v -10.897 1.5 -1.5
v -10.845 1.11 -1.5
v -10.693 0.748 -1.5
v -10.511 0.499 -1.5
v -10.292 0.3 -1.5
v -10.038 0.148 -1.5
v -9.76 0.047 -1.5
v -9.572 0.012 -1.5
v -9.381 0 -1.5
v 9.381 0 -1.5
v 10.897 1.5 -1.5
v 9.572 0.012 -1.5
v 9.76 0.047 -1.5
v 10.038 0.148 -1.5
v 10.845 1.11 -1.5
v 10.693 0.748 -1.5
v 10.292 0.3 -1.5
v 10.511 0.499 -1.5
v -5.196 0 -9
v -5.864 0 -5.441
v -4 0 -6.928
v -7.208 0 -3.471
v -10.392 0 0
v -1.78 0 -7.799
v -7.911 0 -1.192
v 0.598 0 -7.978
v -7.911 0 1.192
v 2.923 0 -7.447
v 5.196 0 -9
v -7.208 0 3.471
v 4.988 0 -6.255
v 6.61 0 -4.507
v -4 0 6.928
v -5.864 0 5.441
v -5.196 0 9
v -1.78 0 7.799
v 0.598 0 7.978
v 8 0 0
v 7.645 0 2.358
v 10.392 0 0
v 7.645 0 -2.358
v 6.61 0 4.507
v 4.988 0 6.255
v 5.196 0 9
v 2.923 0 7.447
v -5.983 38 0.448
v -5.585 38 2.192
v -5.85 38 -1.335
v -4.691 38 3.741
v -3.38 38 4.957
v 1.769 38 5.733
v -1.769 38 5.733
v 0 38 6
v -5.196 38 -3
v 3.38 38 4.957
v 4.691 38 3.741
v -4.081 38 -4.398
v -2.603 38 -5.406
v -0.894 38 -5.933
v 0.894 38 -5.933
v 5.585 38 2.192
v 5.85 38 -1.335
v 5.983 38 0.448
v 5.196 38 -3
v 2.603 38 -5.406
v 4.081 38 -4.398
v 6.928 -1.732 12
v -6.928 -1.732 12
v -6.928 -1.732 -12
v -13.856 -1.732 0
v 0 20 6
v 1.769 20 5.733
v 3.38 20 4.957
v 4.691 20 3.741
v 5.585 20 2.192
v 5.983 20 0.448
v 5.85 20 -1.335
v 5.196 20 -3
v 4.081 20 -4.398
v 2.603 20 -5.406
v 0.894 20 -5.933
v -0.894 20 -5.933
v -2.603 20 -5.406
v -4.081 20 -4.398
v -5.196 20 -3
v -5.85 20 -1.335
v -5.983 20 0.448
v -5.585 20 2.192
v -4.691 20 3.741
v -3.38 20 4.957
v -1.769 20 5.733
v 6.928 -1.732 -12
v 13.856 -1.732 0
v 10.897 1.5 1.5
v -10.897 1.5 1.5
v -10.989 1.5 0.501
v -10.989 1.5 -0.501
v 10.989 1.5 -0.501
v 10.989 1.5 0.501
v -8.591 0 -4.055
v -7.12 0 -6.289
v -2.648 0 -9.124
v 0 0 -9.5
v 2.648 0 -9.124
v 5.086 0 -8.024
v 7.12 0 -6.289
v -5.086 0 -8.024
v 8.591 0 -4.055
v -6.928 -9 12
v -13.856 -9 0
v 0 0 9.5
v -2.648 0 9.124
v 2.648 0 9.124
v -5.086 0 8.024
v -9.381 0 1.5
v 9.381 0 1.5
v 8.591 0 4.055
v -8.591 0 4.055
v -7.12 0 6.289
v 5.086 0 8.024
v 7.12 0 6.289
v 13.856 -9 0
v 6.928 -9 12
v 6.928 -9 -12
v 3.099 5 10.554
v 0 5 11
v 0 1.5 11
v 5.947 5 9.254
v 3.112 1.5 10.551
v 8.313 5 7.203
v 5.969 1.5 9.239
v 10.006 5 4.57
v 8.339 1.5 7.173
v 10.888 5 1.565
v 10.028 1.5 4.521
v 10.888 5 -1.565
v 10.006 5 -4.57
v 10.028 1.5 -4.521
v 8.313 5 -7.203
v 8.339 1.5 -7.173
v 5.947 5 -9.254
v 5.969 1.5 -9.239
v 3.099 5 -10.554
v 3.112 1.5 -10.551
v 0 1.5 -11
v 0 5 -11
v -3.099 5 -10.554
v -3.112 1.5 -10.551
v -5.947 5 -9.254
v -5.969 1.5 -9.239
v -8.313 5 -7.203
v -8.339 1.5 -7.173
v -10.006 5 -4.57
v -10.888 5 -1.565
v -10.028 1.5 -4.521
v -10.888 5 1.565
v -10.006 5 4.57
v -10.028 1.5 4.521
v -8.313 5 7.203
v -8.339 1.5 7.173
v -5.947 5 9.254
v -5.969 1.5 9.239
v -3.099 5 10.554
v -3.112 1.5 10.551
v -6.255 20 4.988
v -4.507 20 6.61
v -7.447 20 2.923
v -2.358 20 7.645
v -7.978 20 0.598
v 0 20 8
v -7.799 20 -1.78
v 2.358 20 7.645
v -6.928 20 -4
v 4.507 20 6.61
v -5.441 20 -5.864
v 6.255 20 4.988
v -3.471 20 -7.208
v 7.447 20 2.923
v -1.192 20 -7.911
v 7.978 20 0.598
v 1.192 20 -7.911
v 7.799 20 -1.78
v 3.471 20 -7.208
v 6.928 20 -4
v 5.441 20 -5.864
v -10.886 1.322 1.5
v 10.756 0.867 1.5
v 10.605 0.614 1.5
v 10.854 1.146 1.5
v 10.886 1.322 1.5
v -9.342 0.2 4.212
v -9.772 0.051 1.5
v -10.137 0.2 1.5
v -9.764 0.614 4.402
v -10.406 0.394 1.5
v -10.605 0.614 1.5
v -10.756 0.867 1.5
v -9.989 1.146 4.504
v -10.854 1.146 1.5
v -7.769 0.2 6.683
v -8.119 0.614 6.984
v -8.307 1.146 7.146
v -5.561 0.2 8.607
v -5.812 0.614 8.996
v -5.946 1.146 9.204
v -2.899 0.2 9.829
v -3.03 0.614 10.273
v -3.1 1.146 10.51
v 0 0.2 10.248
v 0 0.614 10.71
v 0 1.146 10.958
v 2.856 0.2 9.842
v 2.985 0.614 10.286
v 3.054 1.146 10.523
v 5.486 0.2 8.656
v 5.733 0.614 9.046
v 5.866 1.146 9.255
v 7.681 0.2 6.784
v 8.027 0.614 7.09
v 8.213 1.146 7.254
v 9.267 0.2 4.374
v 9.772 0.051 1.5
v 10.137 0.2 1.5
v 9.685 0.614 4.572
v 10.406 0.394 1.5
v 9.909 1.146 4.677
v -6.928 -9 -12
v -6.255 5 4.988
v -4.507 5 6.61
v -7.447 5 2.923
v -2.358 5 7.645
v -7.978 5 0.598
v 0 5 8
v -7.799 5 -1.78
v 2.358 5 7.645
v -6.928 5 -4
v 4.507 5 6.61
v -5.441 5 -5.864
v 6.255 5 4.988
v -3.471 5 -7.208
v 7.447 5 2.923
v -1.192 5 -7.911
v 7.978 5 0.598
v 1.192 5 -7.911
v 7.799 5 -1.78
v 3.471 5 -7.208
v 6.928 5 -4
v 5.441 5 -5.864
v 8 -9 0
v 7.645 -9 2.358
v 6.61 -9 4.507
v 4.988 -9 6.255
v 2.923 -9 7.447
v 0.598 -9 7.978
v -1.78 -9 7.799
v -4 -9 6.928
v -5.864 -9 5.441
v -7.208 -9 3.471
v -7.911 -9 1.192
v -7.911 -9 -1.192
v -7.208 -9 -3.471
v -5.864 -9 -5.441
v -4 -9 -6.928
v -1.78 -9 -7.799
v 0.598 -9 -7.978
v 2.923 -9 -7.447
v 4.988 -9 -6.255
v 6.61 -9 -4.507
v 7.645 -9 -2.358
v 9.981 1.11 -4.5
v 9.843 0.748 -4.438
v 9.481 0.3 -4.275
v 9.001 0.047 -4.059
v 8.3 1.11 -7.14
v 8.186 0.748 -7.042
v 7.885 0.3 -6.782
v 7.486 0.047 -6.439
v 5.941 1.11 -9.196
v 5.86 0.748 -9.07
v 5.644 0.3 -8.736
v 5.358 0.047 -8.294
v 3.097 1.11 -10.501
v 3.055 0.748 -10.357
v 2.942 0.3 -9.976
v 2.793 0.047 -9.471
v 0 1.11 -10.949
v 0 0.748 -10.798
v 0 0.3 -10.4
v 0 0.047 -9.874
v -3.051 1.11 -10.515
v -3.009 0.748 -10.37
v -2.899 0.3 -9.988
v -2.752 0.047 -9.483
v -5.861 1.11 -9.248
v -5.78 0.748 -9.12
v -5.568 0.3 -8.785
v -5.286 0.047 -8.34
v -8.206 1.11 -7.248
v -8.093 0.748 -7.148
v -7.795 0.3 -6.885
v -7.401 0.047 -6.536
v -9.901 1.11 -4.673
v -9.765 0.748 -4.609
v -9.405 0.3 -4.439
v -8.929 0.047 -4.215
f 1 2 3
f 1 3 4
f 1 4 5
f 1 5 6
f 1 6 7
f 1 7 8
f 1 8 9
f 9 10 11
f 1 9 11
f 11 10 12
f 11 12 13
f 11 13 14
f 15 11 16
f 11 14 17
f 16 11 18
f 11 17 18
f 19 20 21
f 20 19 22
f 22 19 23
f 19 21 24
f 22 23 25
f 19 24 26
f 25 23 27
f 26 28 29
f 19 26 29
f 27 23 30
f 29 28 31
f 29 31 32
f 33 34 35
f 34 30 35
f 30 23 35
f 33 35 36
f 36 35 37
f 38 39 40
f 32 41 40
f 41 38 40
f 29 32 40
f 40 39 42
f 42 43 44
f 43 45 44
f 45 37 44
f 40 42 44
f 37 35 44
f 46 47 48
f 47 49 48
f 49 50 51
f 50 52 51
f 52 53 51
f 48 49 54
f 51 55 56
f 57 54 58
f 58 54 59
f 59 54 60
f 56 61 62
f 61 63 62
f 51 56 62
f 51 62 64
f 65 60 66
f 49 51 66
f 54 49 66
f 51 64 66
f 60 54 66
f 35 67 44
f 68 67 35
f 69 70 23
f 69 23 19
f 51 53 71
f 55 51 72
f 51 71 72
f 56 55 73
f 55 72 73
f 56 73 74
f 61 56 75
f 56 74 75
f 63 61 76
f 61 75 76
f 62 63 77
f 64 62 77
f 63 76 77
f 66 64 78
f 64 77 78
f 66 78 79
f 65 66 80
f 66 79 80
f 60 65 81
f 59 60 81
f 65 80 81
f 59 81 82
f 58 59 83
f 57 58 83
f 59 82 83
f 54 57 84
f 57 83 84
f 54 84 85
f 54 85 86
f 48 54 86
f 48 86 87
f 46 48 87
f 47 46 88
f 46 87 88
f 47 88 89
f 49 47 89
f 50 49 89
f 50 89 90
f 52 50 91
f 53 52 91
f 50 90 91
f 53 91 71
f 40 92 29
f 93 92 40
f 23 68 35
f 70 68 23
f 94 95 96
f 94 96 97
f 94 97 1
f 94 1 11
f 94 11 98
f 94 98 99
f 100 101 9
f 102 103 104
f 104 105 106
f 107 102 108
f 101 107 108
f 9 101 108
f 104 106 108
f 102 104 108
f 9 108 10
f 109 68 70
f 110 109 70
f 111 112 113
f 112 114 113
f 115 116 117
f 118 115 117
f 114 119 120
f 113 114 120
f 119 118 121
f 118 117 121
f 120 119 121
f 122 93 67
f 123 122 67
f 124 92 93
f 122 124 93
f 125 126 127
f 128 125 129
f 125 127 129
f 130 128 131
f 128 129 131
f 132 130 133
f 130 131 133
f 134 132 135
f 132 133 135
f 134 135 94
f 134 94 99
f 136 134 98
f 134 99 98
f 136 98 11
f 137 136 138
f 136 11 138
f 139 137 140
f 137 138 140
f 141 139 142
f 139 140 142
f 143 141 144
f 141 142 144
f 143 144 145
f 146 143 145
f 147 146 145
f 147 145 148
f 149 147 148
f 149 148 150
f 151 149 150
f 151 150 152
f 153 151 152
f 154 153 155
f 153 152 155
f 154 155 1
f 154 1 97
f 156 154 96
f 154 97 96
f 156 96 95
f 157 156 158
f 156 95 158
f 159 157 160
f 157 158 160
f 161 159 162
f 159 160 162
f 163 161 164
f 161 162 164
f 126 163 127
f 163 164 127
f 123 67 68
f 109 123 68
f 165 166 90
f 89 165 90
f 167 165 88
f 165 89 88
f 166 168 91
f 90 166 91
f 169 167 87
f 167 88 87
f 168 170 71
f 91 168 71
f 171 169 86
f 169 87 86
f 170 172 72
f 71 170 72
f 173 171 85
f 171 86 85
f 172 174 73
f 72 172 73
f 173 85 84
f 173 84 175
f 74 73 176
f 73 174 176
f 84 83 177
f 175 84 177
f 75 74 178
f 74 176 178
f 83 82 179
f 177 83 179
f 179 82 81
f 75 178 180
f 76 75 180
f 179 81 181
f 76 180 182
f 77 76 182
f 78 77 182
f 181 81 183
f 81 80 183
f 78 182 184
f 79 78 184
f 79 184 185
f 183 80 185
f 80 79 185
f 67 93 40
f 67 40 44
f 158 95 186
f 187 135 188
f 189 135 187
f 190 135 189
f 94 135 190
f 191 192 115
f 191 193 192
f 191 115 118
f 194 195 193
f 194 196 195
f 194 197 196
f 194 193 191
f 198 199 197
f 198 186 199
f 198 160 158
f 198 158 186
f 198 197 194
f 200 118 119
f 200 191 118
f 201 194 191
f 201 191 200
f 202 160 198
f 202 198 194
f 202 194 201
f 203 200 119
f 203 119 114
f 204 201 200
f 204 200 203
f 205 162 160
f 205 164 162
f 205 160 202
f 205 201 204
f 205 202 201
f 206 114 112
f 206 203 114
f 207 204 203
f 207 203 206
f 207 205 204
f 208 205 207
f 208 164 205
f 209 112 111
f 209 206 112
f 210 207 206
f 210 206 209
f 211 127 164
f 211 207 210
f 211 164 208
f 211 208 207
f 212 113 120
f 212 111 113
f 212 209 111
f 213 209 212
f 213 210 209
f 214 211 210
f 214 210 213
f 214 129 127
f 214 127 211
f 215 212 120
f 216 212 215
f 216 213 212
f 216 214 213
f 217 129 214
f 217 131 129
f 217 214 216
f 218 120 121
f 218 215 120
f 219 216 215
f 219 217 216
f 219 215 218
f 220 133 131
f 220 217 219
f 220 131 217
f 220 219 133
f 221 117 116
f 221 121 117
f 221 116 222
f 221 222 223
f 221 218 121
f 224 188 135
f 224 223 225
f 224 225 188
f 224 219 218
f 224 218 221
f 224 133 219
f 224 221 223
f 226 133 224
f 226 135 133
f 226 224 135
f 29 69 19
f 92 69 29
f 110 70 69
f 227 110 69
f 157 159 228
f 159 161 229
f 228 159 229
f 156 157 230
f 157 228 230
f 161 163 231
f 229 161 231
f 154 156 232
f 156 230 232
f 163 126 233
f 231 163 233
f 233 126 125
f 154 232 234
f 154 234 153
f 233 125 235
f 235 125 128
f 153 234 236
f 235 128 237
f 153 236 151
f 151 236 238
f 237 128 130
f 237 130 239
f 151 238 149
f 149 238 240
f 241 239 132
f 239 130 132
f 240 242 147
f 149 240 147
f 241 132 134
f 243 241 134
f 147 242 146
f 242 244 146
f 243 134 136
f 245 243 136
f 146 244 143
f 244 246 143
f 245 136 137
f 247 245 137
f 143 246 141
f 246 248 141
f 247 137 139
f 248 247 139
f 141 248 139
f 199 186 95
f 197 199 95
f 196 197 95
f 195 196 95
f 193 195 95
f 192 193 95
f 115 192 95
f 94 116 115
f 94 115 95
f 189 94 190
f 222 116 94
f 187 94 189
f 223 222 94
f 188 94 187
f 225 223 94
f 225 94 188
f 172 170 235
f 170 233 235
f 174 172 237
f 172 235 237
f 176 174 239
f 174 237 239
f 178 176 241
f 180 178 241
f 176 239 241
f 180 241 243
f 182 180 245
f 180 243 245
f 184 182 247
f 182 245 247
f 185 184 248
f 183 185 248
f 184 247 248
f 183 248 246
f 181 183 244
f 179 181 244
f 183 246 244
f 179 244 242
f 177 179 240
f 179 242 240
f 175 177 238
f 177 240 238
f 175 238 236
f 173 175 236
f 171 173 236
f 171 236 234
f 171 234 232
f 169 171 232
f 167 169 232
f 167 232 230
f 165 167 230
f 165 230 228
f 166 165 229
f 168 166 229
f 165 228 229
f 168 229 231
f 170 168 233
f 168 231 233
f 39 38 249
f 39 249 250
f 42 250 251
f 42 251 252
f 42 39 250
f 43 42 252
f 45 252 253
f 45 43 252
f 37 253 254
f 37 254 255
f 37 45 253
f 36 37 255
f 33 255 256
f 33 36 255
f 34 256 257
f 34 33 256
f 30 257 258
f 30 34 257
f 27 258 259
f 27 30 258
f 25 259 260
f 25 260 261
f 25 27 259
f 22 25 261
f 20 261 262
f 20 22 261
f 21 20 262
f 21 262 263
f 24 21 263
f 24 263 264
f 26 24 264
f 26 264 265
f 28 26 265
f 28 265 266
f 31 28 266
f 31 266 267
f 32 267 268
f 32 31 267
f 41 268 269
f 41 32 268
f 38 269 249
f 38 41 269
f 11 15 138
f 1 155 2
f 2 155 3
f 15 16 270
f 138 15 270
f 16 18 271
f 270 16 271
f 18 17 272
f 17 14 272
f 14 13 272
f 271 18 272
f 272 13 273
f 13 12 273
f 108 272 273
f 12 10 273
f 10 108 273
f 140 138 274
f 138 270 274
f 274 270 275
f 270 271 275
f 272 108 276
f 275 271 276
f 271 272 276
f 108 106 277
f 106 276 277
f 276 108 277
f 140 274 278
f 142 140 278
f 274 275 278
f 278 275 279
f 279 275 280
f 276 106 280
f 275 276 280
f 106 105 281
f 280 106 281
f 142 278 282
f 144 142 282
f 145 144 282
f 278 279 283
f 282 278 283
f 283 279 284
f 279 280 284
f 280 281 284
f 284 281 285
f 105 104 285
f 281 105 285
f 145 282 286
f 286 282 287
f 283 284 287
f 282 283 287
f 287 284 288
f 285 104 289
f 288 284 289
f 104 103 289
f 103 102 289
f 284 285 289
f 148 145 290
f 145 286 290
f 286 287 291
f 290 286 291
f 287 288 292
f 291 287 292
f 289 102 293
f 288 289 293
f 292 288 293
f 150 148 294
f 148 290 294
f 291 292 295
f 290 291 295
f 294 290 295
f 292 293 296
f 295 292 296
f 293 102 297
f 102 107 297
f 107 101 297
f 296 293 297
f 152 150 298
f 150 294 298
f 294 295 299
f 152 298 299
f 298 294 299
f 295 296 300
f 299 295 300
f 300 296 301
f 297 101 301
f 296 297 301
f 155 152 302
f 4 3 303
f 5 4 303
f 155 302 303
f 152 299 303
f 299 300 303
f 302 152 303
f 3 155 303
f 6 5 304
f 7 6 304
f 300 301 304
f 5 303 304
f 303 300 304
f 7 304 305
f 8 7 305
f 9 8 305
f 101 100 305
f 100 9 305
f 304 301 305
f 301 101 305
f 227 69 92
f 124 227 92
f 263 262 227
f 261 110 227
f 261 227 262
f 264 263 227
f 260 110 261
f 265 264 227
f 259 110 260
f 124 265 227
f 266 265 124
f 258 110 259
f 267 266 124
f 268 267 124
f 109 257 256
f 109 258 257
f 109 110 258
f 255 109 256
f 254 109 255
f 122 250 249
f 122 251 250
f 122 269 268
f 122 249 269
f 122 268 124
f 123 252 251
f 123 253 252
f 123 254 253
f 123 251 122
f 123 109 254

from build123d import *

# Parameters (mm, degrees)
F2_R     = 8
F3_DEPTH = 9
F4_W     = 25
F4_H     = 3
F5_DEPTH = 1.5
F6_R     = 1.5
F7_SIZE2 = 1.7320508076
F7_SIZE  = 3


with BuildPart() as f1:
    # F0 (on Right) → F1 (revolve)
    with BuildSketch(Plane.YZ):
        Polygon((0, 11), (0, 0), (38, 0), (38, 6), (20, 6), (20, 8), (5, 8), (5, 11), align=None)
    revolve(axis=Axis((0, 13.9462187291, 0), (0, 1, 0)))

    # F4 (on face) → F5 (cut)
    with BuildSketch(Plane.XZ):
        with Locations((0.4612209588, 0)):
            Rectangle(F4_W, F4_H)
    extrude(amount=-F5_DEPTH, mode=Mode.SUBTRACT)

    # F6
    f6_edges = [f1.edges().sort_by_distance(p)[0] for p in [
        (-7.228416, 0, 8.291562),
        (7.228416, 0, 8.291562),
        (0, 0, -11),
    ]]
    fillet(f6_edges, radius=F6_R)


with BuildPart() as f3:
    # F2 (on Front) → F3 (new body)
    with BuildSketch(Plane.XZ):
        Polygon((-6.9282032303, -12), (6.9282032303, -12), (13.8564064606, 0), (6.9282032303, 12), (-6.9282032303, 12), (-13.8564064606, 0), align=None)
        Circle(F2_R, mode=Mode.SUBTRACT)
    extrude(amount=F3_DEPTH)

    # F7
    f7_edges = [f3.edges().sort_by_distance(p)[0] for p in [
        (0, 0, 12),
        (10.392305, 0, 6),
        (10.392305, 0, -6),
        (0, 0, -12),
        (-10.392305, 0, -6),
        (-10.392305, 0, 6),
    ]]
    f7_side = f3.faces().sort_by_distance((0, 0, -11.633394))[0]
    chamfer(f7_edges, length=F7_SIZE, length2=F7_SIZE2, reference=f7_side)


solid = Compound([f1.part, f3.part])
